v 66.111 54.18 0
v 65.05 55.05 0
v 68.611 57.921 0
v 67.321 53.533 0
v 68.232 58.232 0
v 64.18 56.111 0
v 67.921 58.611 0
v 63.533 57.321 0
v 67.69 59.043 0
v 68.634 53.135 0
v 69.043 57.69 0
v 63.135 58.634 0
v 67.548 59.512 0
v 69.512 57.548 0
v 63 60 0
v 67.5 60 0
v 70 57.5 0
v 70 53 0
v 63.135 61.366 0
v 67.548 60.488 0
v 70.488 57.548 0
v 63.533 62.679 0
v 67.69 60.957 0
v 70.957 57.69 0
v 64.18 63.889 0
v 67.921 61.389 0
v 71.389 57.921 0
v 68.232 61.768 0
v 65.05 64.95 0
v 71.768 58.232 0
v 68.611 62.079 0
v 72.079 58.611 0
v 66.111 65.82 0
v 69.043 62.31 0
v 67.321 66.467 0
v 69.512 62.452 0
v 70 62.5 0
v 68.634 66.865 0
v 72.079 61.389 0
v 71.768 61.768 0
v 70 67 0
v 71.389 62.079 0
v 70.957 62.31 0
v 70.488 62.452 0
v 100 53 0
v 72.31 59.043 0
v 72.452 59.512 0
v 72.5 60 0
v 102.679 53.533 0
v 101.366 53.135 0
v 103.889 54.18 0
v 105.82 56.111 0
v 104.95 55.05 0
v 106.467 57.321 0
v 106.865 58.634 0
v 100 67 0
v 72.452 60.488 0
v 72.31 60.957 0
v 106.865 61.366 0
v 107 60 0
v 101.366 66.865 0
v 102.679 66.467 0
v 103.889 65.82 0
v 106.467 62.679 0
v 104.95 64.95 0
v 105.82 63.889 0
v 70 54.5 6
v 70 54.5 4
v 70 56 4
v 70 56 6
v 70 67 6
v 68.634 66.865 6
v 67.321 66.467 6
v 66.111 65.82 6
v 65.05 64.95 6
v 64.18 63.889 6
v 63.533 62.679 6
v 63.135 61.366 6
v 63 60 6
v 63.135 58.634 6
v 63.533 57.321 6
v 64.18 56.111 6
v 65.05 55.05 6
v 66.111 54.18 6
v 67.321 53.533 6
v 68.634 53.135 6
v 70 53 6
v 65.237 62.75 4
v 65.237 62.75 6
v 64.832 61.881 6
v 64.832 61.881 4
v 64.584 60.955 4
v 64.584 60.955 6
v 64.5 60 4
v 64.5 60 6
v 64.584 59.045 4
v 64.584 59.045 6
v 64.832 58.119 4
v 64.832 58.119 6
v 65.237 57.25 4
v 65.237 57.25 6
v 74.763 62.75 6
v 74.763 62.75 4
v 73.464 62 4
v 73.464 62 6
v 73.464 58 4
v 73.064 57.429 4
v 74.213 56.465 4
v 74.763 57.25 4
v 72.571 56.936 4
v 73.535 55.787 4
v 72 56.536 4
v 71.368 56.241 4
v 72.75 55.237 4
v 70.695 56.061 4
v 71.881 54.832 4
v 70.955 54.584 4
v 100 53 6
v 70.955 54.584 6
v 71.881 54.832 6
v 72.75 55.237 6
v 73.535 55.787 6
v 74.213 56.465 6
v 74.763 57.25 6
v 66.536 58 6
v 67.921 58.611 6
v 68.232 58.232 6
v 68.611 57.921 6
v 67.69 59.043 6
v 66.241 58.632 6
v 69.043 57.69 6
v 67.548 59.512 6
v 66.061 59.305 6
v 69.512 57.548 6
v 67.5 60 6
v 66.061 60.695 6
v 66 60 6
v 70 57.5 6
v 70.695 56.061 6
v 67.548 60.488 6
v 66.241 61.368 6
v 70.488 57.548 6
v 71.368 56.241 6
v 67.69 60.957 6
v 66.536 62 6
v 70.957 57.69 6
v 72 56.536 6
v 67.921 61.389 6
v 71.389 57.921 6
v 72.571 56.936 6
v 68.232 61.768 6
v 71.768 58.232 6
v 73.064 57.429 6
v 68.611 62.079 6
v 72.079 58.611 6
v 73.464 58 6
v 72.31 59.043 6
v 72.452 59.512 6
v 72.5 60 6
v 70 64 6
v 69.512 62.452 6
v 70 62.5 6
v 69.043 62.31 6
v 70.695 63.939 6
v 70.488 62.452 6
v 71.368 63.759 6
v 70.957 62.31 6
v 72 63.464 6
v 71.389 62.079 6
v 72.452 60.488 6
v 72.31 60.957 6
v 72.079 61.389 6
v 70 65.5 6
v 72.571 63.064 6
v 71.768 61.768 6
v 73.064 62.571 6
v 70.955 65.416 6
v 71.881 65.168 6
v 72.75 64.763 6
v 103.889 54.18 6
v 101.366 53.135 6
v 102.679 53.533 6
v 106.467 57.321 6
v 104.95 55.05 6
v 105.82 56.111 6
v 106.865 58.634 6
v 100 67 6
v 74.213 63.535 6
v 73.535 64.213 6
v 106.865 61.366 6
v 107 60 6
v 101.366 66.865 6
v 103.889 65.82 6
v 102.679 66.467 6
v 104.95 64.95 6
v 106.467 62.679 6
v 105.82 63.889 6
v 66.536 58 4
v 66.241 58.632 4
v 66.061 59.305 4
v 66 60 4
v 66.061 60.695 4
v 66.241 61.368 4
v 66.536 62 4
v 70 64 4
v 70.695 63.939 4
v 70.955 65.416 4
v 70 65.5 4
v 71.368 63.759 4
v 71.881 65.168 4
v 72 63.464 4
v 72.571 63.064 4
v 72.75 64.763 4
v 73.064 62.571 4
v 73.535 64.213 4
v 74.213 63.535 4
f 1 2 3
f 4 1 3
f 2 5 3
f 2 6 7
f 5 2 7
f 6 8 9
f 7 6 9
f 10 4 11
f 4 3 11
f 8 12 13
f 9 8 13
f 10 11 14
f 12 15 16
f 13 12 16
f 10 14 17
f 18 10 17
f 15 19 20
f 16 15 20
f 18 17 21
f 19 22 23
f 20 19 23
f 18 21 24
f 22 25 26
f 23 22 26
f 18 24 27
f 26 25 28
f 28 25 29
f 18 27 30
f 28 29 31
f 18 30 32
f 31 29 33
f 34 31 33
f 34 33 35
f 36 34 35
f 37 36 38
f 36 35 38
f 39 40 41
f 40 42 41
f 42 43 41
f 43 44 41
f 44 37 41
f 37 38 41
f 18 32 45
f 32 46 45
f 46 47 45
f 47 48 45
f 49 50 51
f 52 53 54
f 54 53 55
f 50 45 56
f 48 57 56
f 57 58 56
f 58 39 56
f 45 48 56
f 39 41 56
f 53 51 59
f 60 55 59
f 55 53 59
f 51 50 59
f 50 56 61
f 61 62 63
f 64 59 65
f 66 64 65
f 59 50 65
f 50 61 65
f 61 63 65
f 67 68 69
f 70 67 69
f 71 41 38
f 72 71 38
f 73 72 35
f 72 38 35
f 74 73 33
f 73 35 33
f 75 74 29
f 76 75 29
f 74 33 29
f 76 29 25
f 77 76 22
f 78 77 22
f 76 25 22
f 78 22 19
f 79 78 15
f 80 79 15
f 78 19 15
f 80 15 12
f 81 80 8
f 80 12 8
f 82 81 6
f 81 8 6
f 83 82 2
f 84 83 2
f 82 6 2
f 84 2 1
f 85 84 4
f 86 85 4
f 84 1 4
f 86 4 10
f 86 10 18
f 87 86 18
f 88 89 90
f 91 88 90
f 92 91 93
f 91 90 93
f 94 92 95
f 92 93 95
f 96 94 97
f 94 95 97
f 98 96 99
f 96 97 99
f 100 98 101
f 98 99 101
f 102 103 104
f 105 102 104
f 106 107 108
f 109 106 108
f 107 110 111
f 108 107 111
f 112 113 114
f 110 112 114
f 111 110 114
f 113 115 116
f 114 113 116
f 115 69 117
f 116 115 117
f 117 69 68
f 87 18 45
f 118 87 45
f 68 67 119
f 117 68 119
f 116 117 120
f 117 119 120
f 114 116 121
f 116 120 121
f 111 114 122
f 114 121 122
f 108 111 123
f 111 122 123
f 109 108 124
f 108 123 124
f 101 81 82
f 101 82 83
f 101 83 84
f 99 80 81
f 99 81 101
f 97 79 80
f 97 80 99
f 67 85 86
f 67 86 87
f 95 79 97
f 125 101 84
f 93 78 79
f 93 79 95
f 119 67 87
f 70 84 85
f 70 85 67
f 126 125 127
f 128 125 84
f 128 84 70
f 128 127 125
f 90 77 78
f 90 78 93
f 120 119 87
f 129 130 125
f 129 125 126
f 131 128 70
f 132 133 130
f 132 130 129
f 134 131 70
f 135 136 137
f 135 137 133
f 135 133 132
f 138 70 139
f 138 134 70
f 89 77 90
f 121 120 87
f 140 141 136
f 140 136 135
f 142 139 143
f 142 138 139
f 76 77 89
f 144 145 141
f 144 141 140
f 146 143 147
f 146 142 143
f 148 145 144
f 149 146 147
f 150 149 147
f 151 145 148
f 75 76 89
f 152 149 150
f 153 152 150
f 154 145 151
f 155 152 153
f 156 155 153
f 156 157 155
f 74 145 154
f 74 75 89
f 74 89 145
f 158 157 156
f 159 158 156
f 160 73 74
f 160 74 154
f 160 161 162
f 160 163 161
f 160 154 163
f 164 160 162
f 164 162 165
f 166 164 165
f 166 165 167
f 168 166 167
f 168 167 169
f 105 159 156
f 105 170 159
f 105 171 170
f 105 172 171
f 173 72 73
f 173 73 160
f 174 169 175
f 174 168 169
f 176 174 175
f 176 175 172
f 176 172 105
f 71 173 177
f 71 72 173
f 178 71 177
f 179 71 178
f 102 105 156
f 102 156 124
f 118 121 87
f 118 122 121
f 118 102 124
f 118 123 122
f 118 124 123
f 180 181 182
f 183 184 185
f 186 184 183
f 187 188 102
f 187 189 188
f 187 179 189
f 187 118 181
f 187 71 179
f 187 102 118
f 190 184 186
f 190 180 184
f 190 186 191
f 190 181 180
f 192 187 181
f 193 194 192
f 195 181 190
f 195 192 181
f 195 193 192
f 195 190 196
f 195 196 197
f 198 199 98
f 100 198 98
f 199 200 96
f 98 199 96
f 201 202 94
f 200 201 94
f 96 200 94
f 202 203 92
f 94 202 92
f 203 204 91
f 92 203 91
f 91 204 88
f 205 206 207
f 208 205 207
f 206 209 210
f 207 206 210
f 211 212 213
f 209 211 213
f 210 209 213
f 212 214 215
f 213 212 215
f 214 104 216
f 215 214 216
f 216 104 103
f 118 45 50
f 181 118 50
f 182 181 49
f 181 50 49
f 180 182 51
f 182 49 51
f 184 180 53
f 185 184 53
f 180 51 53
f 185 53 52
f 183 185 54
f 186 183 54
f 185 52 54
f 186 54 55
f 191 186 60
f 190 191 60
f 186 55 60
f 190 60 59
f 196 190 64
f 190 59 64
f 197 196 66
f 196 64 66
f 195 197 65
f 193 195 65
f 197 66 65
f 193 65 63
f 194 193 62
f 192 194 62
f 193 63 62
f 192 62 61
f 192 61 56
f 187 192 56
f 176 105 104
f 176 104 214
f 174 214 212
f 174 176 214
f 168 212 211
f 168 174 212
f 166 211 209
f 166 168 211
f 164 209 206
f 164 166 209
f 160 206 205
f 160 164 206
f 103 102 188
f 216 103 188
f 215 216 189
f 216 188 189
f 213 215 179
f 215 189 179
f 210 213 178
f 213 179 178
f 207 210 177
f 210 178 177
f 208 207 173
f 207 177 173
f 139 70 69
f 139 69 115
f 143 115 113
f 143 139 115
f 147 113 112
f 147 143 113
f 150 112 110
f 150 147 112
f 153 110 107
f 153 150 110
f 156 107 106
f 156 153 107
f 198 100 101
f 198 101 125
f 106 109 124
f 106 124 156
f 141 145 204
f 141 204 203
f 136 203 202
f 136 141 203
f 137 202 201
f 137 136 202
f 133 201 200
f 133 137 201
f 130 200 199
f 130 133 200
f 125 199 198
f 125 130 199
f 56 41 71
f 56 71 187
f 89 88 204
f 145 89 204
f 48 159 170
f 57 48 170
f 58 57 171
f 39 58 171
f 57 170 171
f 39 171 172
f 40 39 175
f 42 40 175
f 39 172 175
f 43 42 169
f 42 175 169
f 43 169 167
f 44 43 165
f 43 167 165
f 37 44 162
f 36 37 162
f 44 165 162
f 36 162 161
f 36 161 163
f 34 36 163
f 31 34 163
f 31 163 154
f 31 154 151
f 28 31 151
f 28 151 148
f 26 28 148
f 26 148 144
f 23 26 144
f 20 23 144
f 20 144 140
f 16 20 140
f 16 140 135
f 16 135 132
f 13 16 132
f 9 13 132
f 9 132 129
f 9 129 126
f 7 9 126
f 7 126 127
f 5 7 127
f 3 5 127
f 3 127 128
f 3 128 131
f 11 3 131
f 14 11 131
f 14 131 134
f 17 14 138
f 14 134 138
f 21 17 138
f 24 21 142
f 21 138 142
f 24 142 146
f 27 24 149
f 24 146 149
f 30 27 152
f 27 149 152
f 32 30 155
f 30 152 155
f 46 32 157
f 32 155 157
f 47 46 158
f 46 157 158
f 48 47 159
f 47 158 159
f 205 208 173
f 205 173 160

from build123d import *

# Parameters (mm, degrees)
PAD008_DEPTH          = 6
SKETCH017_R           = 2.5
POCKET008_DEPTH       = 6.001
POCKET009_DEPTH       = 2
POLARPATTERN001_COUNT = 3


with BuildPart() as part:
    # Sketch016 → Pad008 (new body)
    with BuildSketch(Plane.XY):
        with BuildLine():
            ThreePointArc((0, 7), (-7, 0), (0, -7))
            Line((0, -7), (30, -7))
            ThreePointArc((30, -7), (37, 0), (30, 7))
            Line((0, 7), (30, 7))
        make_face()
    extrude(amount=PAD008_DEPTH)

    # Sketch017 (on Face6 of Pad008) → Pocket008 (cut, through all)
    with BuildSketch(Plane.XY.offset(6)):
        Circle(SKETCH017_R)
    extrude(amount=-POCKET008_DEPTH, mode=Mode.SUBTRACT)

    # Sketch019 (on Face5 of Pocket008) → Pocket009 (cut)
    with BuildSketch(Plane.XY.offset(6)):
        with BuildLine():
            ThreePointArc((-3.464102, 2), (-4, 0), (-3.464102, -2))
            Line((-4.76314, -2.75), (-3.464102, -2))
            ThreePointArc((-4.76314, 2.75), (-5.5, 0), (-4.76314, -2.75))
            Line((-4.76314, 2.75), (-3.464102, 2))
        make_face()
    pocket009 = extrude(amount=-POCKET009_DEPTH, mode=Mode.SUBTRACT)

    # PolarPattern001: Pocket009 ×3 about axis
    polarpattern001_axis = Axis((0, 0, 6), (0, 0, 1))
    for i in range(1, POLARPATTERN001_COUNT):
        add(pocket009.rotate(polarpattern001_axis, i * 360 / POLARPATTERN001_COUNT), mode=Mode.SUBTRACT)


with BuildPart() as part_1:
    # Body002 placement: moved
    add(part.part.moved(Location((70, 60, 0))))


solid = part_1.part
